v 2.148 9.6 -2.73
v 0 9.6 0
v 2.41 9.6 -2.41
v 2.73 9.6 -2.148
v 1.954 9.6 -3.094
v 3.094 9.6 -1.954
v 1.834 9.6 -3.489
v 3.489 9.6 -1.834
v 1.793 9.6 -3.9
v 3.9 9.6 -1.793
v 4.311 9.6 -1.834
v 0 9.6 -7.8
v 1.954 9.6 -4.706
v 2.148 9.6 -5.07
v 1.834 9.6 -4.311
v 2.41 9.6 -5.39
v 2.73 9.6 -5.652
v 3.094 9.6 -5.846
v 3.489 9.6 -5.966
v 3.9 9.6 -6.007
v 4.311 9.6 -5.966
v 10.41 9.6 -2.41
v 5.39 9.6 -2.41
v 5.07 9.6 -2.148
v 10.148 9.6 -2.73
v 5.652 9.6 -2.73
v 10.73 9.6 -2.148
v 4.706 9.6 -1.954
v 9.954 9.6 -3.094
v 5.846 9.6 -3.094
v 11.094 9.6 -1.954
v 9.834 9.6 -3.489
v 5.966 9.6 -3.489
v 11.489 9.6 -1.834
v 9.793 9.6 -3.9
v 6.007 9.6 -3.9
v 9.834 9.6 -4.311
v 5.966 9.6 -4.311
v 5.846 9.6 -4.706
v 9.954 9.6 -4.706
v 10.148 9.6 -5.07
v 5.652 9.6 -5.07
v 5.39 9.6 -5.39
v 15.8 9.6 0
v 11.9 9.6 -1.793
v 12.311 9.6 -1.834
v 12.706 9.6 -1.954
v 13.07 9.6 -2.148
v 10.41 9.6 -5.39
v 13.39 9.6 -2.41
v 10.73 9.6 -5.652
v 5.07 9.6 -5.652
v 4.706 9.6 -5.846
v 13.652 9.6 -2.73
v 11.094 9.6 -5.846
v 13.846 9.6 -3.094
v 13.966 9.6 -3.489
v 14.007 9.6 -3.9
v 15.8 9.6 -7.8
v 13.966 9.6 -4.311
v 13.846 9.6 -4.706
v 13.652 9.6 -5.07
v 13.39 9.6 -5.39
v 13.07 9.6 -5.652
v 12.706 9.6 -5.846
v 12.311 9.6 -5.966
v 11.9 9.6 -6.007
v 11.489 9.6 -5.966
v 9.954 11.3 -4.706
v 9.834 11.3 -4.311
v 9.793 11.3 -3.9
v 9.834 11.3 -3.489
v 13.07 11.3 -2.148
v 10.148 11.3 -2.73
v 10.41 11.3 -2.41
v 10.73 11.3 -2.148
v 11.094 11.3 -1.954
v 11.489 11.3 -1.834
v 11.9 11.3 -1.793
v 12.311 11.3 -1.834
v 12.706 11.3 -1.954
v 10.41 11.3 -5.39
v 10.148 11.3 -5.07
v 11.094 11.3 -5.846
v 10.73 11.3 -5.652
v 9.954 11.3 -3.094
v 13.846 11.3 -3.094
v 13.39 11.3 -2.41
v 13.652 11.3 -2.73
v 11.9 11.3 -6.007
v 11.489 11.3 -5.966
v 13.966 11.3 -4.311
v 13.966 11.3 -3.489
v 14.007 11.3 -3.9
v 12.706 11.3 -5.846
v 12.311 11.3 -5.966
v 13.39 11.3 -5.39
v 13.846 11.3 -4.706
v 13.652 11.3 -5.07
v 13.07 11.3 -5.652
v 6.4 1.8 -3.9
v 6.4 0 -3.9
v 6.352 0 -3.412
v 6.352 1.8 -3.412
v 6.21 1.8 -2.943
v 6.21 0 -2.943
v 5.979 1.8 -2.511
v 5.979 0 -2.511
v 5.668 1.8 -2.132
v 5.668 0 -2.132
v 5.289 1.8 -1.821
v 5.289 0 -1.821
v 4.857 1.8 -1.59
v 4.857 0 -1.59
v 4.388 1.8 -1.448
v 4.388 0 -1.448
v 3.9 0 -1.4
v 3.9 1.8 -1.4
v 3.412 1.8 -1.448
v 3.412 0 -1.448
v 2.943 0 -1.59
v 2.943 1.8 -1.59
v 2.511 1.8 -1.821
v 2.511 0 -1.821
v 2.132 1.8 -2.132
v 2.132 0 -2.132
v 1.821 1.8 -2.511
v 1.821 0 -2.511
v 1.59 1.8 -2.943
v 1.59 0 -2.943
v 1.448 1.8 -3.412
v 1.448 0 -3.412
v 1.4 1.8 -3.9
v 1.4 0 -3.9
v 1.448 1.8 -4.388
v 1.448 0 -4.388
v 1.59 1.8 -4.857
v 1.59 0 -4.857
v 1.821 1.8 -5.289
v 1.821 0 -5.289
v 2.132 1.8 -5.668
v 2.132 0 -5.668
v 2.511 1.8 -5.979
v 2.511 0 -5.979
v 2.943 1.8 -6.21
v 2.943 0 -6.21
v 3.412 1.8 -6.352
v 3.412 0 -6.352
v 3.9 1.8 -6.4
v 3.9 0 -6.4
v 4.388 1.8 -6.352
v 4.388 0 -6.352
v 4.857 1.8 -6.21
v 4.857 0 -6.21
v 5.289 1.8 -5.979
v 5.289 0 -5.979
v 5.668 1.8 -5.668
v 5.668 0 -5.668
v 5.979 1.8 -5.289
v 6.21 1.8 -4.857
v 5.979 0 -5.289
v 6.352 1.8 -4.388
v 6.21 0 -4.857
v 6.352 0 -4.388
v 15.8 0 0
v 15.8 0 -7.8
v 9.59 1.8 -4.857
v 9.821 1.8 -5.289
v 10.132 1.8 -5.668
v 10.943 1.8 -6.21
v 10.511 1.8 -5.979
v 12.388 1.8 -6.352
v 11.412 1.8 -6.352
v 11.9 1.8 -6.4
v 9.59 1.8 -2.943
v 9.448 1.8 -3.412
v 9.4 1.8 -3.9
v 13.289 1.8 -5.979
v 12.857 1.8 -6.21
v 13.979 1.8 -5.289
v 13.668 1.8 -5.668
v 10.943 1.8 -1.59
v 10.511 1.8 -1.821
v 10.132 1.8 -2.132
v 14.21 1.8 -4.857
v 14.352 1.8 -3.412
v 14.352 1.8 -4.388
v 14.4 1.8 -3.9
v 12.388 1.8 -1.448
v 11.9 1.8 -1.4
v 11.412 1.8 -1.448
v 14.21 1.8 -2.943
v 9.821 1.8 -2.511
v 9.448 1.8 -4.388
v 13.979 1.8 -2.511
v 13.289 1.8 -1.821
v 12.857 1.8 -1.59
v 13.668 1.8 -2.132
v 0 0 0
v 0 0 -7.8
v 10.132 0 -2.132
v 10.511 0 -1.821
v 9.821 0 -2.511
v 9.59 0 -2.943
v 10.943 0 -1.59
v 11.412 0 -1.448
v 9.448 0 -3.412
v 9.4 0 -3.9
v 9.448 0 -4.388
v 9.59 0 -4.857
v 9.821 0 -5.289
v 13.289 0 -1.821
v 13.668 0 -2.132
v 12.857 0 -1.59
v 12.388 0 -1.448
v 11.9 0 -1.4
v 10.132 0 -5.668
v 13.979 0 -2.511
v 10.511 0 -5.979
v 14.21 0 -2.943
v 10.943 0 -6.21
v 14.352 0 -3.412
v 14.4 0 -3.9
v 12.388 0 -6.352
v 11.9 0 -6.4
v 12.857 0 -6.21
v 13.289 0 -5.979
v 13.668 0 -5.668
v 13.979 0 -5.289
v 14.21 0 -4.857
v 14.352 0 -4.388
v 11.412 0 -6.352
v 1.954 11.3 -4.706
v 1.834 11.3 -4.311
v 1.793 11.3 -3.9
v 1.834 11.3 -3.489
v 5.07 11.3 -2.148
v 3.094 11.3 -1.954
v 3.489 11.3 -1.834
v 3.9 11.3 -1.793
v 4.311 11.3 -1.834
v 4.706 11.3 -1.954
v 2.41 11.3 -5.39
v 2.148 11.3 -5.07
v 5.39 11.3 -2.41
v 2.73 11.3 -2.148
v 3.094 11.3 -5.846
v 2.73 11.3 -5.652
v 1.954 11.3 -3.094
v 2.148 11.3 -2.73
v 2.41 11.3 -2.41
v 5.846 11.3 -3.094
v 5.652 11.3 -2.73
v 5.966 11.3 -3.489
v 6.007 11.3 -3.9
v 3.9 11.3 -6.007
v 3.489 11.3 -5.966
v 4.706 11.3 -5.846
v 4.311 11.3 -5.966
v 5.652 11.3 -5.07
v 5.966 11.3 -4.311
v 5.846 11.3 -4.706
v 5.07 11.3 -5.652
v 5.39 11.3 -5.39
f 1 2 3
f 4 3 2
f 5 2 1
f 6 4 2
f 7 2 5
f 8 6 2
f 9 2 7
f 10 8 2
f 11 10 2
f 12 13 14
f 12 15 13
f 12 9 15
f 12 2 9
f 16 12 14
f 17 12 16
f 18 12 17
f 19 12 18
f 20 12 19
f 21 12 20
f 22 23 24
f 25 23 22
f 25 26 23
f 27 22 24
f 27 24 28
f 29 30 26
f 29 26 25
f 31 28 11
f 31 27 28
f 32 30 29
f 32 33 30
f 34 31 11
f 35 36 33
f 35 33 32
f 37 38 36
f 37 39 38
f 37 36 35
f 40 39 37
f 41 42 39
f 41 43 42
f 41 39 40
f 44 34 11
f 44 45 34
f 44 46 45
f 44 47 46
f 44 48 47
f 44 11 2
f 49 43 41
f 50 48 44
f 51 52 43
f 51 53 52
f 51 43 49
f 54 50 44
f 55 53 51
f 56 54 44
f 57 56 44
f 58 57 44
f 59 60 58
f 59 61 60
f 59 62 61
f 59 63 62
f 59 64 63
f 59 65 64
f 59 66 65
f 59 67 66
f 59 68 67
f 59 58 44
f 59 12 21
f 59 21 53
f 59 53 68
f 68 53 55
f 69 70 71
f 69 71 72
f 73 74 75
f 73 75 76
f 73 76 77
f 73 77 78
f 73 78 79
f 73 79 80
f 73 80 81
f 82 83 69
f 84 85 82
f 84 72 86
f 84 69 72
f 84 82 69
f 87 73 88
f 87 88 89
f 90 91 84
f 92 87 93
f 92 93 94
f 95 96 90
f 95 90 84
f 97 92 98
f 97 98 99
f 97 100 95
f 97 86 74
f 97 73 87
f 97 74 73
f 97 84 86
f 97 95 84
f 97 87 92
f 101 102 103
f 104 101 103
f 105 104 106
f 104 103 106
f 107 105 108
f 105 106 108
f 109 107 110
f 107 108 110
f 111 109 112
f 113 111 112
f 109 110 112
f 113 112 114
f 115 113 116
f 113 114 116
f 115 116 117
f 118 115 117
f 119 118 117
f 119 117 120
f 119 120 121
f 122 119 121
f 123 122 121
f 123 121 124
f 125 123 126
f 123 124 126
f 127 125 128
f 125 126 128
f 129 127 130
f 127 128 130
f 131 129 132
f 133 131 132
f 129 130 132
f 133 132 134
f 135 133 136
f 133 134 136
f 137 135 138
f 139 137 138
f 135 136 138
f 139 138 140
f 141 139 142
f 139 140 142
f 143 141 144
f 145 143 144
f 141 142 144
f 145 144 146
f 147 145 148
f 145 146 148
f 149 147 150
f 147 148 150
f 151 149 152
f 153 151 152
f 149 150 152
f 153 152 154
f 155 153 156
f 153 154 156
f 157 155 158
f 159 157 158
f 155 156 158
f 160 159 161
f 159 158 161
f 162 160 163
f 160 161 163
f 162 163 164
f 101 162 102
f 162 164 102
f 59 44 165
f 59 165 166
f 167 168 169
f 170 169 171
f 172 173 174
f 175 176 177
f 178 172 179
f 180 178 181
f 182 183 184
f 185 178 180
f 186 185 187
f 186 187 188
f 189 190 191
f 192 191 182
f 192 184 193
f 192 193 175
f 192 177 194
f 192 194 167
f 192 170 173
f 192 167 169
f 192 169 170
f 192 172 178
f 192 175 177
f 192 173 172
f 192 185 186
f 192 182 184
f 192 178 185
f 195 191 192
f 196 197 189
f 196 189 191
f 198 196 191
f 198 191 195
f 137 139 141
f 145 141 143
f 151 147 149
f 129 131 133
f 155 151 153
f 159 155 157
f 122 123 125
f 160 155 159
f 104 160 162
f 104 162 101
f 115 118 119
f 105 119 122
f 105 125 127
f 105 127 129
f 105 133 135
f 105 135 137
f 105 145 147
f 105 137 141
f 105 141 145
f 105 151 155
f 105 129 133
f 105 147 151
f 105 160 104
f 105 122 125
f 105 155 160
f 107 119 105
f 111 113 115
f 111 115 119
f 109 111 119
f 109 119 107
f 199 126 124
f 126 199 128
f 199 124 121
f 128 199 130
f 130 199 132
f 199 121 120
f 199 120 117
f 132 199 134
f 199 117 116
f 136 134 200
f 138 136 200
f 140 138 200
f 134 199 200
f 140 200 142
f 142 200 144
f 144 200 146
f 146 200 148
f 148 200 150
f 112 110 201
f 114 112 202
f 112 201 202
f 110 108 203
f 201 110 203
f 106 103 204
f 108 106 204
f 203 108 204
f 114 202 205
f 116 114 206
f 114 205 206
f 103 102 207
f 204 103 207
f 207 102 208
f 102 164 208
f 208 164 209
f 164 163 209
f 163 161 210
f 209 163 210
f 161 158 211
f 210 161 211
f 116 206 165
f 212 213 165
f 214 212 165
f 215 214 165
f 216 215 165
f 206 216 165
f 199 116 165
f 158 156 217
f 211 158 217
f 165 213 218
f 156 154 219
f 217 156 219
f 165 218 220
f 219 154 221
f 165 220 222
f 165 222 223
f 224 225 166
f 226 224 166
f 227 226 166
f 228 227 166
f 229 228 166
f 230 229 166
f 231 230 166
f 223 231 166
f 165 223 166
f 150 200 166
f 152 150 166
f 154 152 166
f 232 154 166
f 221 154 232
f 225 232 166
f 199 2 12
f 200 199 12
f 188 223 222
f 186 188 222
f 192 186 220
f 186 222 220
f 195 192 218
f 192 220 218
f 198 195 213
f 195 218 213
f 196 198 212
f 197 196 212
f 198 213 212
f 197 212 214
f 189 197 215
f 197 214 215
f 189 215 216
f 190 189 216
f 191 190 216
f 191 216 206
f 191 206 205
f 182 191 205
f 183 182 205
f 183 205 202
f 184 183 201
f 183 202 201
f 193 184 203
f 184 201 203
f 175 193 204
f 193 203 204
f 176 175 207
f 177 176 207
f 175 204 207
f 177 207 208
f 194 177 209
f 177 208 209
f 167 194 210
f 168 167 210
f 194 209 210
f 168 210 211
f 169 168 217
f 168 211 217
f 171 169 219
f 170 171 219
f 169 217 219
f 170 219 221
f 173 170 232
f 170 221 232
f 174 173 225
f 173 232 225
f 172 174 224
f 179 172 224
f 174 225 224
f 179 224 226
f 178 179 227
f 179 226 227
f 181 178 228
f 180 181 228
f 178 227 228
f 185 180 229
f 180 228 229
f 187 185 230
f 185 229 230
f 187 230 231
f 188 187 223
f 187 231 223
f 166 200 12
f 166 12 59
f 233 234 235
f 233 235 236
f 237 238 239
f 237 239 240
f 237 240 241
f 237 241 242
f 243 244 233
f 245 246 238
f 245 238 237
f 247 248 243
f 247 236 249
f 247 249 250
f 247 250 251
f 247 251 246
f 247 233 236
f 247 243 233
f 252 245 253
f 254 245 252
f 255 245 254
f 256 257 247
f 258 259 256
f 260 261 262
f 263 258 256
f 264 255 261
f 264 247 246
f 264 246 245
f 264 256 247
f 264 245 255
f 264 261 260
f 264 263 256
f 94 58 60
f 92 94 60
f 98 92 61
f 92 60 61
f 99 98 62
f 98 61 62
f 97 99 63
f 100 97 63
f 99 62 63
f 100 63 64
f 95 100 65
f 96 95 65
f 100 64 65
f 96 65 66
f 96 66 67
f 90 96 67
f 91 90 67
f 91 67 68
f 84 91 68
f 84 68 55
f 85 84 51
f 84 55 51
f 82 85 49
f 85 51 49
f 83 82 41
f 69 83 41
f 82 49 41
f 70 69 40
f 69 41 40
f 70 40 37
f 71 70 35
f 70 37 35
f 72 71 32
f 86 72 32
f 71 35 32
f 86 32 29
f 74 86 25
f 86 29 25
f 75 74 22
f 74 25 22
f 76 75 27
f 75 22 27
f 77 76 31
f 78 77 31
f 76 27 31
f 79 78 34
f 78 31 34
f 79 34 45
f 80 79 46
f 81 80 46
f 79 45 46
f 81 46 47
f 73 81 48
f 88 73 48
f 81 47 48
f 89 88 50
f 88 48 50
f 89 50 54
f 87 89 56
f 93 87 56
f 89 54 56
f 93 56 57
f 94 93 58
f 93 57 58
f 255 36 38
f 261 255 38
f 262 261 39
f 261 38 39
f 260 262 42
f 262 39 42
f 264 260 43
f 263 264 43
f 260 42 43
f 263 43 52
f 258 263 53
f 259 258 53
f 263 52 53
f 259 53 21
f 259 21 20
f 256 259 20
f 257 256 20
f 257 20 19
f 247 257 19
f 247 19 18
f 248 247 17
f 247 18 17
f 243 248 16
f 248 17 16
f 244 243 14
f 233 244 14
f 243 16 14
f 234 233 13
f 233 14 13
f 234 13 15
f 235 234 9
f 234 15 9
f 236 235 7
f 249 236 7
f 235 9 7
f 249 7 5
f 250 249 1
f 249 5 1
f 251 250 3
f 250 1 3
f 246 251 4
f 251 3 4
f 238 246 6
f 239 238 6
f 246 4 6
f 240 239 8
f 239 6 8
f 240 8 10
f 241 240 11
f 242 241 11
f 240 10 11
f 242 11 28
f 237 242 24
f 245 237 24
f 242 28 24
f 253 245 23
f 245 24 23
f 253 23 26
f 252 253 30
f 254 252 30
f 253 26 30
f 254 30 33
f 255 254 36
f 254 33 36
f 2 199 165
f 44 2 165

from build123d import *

# Parameters (mm, degrees)
SKETCH_1_W          = 15.8
SKETCH_1_H          = 7.8
EXTRUDE_2_DEPTH     = 9.6
SKETCH_2_R          = 2.106660513
EXTRUDE_3_DEPTH     = 1.7
SKETCH_3_R          = 2.5
CUT_EXTRUDE_1_DEPTH = 1.8


with BuildPart() as part:
    # Эскиз1 → Бобышка-Вытянуть2 (new body)
    with BuildSketch(Plane(origin=(0, 0, 0), x_dir=(1, 0, 0), z_dir=(0, 1, 0))):
        with Locations((7.9, 3.9)):
            Rectangle(SKETCH_1_W, SKETCH_1_H)
    extrude(amount=EXTRUDE_2_DEPTH)

    # Эскиз2 → Бобышка-Вытянуть3 (add)
    with BuildSketch(Plane(origin=(0, 9.6, 0), x_dir=(1, 0, 0), z_dir=(0, 1, 0))):
        with Locations((3.9, 3.9)):
            Circle(SKETCH_2_R)
        with Locations((11.9, 3.9)):
            Circle(SKETCH_2_R)
    extrude(amount=EXTRUDE_3_DEPTH)

    # Эскиз3 → Вырез-Вытянуть1 (cut)
    with BuildSketch(Plane.XZ):
        with Locations((11.9, -3.9)):
            Circle(SKETCH_3_R)
        with Locations((3.9, -3.9)):
            Circle(SKETCH_3_R)
    extrude(amount=-CUT_EXTRUDE_1_DEPTH, mode=Mode.SUBTRACT)


solid = part.part
